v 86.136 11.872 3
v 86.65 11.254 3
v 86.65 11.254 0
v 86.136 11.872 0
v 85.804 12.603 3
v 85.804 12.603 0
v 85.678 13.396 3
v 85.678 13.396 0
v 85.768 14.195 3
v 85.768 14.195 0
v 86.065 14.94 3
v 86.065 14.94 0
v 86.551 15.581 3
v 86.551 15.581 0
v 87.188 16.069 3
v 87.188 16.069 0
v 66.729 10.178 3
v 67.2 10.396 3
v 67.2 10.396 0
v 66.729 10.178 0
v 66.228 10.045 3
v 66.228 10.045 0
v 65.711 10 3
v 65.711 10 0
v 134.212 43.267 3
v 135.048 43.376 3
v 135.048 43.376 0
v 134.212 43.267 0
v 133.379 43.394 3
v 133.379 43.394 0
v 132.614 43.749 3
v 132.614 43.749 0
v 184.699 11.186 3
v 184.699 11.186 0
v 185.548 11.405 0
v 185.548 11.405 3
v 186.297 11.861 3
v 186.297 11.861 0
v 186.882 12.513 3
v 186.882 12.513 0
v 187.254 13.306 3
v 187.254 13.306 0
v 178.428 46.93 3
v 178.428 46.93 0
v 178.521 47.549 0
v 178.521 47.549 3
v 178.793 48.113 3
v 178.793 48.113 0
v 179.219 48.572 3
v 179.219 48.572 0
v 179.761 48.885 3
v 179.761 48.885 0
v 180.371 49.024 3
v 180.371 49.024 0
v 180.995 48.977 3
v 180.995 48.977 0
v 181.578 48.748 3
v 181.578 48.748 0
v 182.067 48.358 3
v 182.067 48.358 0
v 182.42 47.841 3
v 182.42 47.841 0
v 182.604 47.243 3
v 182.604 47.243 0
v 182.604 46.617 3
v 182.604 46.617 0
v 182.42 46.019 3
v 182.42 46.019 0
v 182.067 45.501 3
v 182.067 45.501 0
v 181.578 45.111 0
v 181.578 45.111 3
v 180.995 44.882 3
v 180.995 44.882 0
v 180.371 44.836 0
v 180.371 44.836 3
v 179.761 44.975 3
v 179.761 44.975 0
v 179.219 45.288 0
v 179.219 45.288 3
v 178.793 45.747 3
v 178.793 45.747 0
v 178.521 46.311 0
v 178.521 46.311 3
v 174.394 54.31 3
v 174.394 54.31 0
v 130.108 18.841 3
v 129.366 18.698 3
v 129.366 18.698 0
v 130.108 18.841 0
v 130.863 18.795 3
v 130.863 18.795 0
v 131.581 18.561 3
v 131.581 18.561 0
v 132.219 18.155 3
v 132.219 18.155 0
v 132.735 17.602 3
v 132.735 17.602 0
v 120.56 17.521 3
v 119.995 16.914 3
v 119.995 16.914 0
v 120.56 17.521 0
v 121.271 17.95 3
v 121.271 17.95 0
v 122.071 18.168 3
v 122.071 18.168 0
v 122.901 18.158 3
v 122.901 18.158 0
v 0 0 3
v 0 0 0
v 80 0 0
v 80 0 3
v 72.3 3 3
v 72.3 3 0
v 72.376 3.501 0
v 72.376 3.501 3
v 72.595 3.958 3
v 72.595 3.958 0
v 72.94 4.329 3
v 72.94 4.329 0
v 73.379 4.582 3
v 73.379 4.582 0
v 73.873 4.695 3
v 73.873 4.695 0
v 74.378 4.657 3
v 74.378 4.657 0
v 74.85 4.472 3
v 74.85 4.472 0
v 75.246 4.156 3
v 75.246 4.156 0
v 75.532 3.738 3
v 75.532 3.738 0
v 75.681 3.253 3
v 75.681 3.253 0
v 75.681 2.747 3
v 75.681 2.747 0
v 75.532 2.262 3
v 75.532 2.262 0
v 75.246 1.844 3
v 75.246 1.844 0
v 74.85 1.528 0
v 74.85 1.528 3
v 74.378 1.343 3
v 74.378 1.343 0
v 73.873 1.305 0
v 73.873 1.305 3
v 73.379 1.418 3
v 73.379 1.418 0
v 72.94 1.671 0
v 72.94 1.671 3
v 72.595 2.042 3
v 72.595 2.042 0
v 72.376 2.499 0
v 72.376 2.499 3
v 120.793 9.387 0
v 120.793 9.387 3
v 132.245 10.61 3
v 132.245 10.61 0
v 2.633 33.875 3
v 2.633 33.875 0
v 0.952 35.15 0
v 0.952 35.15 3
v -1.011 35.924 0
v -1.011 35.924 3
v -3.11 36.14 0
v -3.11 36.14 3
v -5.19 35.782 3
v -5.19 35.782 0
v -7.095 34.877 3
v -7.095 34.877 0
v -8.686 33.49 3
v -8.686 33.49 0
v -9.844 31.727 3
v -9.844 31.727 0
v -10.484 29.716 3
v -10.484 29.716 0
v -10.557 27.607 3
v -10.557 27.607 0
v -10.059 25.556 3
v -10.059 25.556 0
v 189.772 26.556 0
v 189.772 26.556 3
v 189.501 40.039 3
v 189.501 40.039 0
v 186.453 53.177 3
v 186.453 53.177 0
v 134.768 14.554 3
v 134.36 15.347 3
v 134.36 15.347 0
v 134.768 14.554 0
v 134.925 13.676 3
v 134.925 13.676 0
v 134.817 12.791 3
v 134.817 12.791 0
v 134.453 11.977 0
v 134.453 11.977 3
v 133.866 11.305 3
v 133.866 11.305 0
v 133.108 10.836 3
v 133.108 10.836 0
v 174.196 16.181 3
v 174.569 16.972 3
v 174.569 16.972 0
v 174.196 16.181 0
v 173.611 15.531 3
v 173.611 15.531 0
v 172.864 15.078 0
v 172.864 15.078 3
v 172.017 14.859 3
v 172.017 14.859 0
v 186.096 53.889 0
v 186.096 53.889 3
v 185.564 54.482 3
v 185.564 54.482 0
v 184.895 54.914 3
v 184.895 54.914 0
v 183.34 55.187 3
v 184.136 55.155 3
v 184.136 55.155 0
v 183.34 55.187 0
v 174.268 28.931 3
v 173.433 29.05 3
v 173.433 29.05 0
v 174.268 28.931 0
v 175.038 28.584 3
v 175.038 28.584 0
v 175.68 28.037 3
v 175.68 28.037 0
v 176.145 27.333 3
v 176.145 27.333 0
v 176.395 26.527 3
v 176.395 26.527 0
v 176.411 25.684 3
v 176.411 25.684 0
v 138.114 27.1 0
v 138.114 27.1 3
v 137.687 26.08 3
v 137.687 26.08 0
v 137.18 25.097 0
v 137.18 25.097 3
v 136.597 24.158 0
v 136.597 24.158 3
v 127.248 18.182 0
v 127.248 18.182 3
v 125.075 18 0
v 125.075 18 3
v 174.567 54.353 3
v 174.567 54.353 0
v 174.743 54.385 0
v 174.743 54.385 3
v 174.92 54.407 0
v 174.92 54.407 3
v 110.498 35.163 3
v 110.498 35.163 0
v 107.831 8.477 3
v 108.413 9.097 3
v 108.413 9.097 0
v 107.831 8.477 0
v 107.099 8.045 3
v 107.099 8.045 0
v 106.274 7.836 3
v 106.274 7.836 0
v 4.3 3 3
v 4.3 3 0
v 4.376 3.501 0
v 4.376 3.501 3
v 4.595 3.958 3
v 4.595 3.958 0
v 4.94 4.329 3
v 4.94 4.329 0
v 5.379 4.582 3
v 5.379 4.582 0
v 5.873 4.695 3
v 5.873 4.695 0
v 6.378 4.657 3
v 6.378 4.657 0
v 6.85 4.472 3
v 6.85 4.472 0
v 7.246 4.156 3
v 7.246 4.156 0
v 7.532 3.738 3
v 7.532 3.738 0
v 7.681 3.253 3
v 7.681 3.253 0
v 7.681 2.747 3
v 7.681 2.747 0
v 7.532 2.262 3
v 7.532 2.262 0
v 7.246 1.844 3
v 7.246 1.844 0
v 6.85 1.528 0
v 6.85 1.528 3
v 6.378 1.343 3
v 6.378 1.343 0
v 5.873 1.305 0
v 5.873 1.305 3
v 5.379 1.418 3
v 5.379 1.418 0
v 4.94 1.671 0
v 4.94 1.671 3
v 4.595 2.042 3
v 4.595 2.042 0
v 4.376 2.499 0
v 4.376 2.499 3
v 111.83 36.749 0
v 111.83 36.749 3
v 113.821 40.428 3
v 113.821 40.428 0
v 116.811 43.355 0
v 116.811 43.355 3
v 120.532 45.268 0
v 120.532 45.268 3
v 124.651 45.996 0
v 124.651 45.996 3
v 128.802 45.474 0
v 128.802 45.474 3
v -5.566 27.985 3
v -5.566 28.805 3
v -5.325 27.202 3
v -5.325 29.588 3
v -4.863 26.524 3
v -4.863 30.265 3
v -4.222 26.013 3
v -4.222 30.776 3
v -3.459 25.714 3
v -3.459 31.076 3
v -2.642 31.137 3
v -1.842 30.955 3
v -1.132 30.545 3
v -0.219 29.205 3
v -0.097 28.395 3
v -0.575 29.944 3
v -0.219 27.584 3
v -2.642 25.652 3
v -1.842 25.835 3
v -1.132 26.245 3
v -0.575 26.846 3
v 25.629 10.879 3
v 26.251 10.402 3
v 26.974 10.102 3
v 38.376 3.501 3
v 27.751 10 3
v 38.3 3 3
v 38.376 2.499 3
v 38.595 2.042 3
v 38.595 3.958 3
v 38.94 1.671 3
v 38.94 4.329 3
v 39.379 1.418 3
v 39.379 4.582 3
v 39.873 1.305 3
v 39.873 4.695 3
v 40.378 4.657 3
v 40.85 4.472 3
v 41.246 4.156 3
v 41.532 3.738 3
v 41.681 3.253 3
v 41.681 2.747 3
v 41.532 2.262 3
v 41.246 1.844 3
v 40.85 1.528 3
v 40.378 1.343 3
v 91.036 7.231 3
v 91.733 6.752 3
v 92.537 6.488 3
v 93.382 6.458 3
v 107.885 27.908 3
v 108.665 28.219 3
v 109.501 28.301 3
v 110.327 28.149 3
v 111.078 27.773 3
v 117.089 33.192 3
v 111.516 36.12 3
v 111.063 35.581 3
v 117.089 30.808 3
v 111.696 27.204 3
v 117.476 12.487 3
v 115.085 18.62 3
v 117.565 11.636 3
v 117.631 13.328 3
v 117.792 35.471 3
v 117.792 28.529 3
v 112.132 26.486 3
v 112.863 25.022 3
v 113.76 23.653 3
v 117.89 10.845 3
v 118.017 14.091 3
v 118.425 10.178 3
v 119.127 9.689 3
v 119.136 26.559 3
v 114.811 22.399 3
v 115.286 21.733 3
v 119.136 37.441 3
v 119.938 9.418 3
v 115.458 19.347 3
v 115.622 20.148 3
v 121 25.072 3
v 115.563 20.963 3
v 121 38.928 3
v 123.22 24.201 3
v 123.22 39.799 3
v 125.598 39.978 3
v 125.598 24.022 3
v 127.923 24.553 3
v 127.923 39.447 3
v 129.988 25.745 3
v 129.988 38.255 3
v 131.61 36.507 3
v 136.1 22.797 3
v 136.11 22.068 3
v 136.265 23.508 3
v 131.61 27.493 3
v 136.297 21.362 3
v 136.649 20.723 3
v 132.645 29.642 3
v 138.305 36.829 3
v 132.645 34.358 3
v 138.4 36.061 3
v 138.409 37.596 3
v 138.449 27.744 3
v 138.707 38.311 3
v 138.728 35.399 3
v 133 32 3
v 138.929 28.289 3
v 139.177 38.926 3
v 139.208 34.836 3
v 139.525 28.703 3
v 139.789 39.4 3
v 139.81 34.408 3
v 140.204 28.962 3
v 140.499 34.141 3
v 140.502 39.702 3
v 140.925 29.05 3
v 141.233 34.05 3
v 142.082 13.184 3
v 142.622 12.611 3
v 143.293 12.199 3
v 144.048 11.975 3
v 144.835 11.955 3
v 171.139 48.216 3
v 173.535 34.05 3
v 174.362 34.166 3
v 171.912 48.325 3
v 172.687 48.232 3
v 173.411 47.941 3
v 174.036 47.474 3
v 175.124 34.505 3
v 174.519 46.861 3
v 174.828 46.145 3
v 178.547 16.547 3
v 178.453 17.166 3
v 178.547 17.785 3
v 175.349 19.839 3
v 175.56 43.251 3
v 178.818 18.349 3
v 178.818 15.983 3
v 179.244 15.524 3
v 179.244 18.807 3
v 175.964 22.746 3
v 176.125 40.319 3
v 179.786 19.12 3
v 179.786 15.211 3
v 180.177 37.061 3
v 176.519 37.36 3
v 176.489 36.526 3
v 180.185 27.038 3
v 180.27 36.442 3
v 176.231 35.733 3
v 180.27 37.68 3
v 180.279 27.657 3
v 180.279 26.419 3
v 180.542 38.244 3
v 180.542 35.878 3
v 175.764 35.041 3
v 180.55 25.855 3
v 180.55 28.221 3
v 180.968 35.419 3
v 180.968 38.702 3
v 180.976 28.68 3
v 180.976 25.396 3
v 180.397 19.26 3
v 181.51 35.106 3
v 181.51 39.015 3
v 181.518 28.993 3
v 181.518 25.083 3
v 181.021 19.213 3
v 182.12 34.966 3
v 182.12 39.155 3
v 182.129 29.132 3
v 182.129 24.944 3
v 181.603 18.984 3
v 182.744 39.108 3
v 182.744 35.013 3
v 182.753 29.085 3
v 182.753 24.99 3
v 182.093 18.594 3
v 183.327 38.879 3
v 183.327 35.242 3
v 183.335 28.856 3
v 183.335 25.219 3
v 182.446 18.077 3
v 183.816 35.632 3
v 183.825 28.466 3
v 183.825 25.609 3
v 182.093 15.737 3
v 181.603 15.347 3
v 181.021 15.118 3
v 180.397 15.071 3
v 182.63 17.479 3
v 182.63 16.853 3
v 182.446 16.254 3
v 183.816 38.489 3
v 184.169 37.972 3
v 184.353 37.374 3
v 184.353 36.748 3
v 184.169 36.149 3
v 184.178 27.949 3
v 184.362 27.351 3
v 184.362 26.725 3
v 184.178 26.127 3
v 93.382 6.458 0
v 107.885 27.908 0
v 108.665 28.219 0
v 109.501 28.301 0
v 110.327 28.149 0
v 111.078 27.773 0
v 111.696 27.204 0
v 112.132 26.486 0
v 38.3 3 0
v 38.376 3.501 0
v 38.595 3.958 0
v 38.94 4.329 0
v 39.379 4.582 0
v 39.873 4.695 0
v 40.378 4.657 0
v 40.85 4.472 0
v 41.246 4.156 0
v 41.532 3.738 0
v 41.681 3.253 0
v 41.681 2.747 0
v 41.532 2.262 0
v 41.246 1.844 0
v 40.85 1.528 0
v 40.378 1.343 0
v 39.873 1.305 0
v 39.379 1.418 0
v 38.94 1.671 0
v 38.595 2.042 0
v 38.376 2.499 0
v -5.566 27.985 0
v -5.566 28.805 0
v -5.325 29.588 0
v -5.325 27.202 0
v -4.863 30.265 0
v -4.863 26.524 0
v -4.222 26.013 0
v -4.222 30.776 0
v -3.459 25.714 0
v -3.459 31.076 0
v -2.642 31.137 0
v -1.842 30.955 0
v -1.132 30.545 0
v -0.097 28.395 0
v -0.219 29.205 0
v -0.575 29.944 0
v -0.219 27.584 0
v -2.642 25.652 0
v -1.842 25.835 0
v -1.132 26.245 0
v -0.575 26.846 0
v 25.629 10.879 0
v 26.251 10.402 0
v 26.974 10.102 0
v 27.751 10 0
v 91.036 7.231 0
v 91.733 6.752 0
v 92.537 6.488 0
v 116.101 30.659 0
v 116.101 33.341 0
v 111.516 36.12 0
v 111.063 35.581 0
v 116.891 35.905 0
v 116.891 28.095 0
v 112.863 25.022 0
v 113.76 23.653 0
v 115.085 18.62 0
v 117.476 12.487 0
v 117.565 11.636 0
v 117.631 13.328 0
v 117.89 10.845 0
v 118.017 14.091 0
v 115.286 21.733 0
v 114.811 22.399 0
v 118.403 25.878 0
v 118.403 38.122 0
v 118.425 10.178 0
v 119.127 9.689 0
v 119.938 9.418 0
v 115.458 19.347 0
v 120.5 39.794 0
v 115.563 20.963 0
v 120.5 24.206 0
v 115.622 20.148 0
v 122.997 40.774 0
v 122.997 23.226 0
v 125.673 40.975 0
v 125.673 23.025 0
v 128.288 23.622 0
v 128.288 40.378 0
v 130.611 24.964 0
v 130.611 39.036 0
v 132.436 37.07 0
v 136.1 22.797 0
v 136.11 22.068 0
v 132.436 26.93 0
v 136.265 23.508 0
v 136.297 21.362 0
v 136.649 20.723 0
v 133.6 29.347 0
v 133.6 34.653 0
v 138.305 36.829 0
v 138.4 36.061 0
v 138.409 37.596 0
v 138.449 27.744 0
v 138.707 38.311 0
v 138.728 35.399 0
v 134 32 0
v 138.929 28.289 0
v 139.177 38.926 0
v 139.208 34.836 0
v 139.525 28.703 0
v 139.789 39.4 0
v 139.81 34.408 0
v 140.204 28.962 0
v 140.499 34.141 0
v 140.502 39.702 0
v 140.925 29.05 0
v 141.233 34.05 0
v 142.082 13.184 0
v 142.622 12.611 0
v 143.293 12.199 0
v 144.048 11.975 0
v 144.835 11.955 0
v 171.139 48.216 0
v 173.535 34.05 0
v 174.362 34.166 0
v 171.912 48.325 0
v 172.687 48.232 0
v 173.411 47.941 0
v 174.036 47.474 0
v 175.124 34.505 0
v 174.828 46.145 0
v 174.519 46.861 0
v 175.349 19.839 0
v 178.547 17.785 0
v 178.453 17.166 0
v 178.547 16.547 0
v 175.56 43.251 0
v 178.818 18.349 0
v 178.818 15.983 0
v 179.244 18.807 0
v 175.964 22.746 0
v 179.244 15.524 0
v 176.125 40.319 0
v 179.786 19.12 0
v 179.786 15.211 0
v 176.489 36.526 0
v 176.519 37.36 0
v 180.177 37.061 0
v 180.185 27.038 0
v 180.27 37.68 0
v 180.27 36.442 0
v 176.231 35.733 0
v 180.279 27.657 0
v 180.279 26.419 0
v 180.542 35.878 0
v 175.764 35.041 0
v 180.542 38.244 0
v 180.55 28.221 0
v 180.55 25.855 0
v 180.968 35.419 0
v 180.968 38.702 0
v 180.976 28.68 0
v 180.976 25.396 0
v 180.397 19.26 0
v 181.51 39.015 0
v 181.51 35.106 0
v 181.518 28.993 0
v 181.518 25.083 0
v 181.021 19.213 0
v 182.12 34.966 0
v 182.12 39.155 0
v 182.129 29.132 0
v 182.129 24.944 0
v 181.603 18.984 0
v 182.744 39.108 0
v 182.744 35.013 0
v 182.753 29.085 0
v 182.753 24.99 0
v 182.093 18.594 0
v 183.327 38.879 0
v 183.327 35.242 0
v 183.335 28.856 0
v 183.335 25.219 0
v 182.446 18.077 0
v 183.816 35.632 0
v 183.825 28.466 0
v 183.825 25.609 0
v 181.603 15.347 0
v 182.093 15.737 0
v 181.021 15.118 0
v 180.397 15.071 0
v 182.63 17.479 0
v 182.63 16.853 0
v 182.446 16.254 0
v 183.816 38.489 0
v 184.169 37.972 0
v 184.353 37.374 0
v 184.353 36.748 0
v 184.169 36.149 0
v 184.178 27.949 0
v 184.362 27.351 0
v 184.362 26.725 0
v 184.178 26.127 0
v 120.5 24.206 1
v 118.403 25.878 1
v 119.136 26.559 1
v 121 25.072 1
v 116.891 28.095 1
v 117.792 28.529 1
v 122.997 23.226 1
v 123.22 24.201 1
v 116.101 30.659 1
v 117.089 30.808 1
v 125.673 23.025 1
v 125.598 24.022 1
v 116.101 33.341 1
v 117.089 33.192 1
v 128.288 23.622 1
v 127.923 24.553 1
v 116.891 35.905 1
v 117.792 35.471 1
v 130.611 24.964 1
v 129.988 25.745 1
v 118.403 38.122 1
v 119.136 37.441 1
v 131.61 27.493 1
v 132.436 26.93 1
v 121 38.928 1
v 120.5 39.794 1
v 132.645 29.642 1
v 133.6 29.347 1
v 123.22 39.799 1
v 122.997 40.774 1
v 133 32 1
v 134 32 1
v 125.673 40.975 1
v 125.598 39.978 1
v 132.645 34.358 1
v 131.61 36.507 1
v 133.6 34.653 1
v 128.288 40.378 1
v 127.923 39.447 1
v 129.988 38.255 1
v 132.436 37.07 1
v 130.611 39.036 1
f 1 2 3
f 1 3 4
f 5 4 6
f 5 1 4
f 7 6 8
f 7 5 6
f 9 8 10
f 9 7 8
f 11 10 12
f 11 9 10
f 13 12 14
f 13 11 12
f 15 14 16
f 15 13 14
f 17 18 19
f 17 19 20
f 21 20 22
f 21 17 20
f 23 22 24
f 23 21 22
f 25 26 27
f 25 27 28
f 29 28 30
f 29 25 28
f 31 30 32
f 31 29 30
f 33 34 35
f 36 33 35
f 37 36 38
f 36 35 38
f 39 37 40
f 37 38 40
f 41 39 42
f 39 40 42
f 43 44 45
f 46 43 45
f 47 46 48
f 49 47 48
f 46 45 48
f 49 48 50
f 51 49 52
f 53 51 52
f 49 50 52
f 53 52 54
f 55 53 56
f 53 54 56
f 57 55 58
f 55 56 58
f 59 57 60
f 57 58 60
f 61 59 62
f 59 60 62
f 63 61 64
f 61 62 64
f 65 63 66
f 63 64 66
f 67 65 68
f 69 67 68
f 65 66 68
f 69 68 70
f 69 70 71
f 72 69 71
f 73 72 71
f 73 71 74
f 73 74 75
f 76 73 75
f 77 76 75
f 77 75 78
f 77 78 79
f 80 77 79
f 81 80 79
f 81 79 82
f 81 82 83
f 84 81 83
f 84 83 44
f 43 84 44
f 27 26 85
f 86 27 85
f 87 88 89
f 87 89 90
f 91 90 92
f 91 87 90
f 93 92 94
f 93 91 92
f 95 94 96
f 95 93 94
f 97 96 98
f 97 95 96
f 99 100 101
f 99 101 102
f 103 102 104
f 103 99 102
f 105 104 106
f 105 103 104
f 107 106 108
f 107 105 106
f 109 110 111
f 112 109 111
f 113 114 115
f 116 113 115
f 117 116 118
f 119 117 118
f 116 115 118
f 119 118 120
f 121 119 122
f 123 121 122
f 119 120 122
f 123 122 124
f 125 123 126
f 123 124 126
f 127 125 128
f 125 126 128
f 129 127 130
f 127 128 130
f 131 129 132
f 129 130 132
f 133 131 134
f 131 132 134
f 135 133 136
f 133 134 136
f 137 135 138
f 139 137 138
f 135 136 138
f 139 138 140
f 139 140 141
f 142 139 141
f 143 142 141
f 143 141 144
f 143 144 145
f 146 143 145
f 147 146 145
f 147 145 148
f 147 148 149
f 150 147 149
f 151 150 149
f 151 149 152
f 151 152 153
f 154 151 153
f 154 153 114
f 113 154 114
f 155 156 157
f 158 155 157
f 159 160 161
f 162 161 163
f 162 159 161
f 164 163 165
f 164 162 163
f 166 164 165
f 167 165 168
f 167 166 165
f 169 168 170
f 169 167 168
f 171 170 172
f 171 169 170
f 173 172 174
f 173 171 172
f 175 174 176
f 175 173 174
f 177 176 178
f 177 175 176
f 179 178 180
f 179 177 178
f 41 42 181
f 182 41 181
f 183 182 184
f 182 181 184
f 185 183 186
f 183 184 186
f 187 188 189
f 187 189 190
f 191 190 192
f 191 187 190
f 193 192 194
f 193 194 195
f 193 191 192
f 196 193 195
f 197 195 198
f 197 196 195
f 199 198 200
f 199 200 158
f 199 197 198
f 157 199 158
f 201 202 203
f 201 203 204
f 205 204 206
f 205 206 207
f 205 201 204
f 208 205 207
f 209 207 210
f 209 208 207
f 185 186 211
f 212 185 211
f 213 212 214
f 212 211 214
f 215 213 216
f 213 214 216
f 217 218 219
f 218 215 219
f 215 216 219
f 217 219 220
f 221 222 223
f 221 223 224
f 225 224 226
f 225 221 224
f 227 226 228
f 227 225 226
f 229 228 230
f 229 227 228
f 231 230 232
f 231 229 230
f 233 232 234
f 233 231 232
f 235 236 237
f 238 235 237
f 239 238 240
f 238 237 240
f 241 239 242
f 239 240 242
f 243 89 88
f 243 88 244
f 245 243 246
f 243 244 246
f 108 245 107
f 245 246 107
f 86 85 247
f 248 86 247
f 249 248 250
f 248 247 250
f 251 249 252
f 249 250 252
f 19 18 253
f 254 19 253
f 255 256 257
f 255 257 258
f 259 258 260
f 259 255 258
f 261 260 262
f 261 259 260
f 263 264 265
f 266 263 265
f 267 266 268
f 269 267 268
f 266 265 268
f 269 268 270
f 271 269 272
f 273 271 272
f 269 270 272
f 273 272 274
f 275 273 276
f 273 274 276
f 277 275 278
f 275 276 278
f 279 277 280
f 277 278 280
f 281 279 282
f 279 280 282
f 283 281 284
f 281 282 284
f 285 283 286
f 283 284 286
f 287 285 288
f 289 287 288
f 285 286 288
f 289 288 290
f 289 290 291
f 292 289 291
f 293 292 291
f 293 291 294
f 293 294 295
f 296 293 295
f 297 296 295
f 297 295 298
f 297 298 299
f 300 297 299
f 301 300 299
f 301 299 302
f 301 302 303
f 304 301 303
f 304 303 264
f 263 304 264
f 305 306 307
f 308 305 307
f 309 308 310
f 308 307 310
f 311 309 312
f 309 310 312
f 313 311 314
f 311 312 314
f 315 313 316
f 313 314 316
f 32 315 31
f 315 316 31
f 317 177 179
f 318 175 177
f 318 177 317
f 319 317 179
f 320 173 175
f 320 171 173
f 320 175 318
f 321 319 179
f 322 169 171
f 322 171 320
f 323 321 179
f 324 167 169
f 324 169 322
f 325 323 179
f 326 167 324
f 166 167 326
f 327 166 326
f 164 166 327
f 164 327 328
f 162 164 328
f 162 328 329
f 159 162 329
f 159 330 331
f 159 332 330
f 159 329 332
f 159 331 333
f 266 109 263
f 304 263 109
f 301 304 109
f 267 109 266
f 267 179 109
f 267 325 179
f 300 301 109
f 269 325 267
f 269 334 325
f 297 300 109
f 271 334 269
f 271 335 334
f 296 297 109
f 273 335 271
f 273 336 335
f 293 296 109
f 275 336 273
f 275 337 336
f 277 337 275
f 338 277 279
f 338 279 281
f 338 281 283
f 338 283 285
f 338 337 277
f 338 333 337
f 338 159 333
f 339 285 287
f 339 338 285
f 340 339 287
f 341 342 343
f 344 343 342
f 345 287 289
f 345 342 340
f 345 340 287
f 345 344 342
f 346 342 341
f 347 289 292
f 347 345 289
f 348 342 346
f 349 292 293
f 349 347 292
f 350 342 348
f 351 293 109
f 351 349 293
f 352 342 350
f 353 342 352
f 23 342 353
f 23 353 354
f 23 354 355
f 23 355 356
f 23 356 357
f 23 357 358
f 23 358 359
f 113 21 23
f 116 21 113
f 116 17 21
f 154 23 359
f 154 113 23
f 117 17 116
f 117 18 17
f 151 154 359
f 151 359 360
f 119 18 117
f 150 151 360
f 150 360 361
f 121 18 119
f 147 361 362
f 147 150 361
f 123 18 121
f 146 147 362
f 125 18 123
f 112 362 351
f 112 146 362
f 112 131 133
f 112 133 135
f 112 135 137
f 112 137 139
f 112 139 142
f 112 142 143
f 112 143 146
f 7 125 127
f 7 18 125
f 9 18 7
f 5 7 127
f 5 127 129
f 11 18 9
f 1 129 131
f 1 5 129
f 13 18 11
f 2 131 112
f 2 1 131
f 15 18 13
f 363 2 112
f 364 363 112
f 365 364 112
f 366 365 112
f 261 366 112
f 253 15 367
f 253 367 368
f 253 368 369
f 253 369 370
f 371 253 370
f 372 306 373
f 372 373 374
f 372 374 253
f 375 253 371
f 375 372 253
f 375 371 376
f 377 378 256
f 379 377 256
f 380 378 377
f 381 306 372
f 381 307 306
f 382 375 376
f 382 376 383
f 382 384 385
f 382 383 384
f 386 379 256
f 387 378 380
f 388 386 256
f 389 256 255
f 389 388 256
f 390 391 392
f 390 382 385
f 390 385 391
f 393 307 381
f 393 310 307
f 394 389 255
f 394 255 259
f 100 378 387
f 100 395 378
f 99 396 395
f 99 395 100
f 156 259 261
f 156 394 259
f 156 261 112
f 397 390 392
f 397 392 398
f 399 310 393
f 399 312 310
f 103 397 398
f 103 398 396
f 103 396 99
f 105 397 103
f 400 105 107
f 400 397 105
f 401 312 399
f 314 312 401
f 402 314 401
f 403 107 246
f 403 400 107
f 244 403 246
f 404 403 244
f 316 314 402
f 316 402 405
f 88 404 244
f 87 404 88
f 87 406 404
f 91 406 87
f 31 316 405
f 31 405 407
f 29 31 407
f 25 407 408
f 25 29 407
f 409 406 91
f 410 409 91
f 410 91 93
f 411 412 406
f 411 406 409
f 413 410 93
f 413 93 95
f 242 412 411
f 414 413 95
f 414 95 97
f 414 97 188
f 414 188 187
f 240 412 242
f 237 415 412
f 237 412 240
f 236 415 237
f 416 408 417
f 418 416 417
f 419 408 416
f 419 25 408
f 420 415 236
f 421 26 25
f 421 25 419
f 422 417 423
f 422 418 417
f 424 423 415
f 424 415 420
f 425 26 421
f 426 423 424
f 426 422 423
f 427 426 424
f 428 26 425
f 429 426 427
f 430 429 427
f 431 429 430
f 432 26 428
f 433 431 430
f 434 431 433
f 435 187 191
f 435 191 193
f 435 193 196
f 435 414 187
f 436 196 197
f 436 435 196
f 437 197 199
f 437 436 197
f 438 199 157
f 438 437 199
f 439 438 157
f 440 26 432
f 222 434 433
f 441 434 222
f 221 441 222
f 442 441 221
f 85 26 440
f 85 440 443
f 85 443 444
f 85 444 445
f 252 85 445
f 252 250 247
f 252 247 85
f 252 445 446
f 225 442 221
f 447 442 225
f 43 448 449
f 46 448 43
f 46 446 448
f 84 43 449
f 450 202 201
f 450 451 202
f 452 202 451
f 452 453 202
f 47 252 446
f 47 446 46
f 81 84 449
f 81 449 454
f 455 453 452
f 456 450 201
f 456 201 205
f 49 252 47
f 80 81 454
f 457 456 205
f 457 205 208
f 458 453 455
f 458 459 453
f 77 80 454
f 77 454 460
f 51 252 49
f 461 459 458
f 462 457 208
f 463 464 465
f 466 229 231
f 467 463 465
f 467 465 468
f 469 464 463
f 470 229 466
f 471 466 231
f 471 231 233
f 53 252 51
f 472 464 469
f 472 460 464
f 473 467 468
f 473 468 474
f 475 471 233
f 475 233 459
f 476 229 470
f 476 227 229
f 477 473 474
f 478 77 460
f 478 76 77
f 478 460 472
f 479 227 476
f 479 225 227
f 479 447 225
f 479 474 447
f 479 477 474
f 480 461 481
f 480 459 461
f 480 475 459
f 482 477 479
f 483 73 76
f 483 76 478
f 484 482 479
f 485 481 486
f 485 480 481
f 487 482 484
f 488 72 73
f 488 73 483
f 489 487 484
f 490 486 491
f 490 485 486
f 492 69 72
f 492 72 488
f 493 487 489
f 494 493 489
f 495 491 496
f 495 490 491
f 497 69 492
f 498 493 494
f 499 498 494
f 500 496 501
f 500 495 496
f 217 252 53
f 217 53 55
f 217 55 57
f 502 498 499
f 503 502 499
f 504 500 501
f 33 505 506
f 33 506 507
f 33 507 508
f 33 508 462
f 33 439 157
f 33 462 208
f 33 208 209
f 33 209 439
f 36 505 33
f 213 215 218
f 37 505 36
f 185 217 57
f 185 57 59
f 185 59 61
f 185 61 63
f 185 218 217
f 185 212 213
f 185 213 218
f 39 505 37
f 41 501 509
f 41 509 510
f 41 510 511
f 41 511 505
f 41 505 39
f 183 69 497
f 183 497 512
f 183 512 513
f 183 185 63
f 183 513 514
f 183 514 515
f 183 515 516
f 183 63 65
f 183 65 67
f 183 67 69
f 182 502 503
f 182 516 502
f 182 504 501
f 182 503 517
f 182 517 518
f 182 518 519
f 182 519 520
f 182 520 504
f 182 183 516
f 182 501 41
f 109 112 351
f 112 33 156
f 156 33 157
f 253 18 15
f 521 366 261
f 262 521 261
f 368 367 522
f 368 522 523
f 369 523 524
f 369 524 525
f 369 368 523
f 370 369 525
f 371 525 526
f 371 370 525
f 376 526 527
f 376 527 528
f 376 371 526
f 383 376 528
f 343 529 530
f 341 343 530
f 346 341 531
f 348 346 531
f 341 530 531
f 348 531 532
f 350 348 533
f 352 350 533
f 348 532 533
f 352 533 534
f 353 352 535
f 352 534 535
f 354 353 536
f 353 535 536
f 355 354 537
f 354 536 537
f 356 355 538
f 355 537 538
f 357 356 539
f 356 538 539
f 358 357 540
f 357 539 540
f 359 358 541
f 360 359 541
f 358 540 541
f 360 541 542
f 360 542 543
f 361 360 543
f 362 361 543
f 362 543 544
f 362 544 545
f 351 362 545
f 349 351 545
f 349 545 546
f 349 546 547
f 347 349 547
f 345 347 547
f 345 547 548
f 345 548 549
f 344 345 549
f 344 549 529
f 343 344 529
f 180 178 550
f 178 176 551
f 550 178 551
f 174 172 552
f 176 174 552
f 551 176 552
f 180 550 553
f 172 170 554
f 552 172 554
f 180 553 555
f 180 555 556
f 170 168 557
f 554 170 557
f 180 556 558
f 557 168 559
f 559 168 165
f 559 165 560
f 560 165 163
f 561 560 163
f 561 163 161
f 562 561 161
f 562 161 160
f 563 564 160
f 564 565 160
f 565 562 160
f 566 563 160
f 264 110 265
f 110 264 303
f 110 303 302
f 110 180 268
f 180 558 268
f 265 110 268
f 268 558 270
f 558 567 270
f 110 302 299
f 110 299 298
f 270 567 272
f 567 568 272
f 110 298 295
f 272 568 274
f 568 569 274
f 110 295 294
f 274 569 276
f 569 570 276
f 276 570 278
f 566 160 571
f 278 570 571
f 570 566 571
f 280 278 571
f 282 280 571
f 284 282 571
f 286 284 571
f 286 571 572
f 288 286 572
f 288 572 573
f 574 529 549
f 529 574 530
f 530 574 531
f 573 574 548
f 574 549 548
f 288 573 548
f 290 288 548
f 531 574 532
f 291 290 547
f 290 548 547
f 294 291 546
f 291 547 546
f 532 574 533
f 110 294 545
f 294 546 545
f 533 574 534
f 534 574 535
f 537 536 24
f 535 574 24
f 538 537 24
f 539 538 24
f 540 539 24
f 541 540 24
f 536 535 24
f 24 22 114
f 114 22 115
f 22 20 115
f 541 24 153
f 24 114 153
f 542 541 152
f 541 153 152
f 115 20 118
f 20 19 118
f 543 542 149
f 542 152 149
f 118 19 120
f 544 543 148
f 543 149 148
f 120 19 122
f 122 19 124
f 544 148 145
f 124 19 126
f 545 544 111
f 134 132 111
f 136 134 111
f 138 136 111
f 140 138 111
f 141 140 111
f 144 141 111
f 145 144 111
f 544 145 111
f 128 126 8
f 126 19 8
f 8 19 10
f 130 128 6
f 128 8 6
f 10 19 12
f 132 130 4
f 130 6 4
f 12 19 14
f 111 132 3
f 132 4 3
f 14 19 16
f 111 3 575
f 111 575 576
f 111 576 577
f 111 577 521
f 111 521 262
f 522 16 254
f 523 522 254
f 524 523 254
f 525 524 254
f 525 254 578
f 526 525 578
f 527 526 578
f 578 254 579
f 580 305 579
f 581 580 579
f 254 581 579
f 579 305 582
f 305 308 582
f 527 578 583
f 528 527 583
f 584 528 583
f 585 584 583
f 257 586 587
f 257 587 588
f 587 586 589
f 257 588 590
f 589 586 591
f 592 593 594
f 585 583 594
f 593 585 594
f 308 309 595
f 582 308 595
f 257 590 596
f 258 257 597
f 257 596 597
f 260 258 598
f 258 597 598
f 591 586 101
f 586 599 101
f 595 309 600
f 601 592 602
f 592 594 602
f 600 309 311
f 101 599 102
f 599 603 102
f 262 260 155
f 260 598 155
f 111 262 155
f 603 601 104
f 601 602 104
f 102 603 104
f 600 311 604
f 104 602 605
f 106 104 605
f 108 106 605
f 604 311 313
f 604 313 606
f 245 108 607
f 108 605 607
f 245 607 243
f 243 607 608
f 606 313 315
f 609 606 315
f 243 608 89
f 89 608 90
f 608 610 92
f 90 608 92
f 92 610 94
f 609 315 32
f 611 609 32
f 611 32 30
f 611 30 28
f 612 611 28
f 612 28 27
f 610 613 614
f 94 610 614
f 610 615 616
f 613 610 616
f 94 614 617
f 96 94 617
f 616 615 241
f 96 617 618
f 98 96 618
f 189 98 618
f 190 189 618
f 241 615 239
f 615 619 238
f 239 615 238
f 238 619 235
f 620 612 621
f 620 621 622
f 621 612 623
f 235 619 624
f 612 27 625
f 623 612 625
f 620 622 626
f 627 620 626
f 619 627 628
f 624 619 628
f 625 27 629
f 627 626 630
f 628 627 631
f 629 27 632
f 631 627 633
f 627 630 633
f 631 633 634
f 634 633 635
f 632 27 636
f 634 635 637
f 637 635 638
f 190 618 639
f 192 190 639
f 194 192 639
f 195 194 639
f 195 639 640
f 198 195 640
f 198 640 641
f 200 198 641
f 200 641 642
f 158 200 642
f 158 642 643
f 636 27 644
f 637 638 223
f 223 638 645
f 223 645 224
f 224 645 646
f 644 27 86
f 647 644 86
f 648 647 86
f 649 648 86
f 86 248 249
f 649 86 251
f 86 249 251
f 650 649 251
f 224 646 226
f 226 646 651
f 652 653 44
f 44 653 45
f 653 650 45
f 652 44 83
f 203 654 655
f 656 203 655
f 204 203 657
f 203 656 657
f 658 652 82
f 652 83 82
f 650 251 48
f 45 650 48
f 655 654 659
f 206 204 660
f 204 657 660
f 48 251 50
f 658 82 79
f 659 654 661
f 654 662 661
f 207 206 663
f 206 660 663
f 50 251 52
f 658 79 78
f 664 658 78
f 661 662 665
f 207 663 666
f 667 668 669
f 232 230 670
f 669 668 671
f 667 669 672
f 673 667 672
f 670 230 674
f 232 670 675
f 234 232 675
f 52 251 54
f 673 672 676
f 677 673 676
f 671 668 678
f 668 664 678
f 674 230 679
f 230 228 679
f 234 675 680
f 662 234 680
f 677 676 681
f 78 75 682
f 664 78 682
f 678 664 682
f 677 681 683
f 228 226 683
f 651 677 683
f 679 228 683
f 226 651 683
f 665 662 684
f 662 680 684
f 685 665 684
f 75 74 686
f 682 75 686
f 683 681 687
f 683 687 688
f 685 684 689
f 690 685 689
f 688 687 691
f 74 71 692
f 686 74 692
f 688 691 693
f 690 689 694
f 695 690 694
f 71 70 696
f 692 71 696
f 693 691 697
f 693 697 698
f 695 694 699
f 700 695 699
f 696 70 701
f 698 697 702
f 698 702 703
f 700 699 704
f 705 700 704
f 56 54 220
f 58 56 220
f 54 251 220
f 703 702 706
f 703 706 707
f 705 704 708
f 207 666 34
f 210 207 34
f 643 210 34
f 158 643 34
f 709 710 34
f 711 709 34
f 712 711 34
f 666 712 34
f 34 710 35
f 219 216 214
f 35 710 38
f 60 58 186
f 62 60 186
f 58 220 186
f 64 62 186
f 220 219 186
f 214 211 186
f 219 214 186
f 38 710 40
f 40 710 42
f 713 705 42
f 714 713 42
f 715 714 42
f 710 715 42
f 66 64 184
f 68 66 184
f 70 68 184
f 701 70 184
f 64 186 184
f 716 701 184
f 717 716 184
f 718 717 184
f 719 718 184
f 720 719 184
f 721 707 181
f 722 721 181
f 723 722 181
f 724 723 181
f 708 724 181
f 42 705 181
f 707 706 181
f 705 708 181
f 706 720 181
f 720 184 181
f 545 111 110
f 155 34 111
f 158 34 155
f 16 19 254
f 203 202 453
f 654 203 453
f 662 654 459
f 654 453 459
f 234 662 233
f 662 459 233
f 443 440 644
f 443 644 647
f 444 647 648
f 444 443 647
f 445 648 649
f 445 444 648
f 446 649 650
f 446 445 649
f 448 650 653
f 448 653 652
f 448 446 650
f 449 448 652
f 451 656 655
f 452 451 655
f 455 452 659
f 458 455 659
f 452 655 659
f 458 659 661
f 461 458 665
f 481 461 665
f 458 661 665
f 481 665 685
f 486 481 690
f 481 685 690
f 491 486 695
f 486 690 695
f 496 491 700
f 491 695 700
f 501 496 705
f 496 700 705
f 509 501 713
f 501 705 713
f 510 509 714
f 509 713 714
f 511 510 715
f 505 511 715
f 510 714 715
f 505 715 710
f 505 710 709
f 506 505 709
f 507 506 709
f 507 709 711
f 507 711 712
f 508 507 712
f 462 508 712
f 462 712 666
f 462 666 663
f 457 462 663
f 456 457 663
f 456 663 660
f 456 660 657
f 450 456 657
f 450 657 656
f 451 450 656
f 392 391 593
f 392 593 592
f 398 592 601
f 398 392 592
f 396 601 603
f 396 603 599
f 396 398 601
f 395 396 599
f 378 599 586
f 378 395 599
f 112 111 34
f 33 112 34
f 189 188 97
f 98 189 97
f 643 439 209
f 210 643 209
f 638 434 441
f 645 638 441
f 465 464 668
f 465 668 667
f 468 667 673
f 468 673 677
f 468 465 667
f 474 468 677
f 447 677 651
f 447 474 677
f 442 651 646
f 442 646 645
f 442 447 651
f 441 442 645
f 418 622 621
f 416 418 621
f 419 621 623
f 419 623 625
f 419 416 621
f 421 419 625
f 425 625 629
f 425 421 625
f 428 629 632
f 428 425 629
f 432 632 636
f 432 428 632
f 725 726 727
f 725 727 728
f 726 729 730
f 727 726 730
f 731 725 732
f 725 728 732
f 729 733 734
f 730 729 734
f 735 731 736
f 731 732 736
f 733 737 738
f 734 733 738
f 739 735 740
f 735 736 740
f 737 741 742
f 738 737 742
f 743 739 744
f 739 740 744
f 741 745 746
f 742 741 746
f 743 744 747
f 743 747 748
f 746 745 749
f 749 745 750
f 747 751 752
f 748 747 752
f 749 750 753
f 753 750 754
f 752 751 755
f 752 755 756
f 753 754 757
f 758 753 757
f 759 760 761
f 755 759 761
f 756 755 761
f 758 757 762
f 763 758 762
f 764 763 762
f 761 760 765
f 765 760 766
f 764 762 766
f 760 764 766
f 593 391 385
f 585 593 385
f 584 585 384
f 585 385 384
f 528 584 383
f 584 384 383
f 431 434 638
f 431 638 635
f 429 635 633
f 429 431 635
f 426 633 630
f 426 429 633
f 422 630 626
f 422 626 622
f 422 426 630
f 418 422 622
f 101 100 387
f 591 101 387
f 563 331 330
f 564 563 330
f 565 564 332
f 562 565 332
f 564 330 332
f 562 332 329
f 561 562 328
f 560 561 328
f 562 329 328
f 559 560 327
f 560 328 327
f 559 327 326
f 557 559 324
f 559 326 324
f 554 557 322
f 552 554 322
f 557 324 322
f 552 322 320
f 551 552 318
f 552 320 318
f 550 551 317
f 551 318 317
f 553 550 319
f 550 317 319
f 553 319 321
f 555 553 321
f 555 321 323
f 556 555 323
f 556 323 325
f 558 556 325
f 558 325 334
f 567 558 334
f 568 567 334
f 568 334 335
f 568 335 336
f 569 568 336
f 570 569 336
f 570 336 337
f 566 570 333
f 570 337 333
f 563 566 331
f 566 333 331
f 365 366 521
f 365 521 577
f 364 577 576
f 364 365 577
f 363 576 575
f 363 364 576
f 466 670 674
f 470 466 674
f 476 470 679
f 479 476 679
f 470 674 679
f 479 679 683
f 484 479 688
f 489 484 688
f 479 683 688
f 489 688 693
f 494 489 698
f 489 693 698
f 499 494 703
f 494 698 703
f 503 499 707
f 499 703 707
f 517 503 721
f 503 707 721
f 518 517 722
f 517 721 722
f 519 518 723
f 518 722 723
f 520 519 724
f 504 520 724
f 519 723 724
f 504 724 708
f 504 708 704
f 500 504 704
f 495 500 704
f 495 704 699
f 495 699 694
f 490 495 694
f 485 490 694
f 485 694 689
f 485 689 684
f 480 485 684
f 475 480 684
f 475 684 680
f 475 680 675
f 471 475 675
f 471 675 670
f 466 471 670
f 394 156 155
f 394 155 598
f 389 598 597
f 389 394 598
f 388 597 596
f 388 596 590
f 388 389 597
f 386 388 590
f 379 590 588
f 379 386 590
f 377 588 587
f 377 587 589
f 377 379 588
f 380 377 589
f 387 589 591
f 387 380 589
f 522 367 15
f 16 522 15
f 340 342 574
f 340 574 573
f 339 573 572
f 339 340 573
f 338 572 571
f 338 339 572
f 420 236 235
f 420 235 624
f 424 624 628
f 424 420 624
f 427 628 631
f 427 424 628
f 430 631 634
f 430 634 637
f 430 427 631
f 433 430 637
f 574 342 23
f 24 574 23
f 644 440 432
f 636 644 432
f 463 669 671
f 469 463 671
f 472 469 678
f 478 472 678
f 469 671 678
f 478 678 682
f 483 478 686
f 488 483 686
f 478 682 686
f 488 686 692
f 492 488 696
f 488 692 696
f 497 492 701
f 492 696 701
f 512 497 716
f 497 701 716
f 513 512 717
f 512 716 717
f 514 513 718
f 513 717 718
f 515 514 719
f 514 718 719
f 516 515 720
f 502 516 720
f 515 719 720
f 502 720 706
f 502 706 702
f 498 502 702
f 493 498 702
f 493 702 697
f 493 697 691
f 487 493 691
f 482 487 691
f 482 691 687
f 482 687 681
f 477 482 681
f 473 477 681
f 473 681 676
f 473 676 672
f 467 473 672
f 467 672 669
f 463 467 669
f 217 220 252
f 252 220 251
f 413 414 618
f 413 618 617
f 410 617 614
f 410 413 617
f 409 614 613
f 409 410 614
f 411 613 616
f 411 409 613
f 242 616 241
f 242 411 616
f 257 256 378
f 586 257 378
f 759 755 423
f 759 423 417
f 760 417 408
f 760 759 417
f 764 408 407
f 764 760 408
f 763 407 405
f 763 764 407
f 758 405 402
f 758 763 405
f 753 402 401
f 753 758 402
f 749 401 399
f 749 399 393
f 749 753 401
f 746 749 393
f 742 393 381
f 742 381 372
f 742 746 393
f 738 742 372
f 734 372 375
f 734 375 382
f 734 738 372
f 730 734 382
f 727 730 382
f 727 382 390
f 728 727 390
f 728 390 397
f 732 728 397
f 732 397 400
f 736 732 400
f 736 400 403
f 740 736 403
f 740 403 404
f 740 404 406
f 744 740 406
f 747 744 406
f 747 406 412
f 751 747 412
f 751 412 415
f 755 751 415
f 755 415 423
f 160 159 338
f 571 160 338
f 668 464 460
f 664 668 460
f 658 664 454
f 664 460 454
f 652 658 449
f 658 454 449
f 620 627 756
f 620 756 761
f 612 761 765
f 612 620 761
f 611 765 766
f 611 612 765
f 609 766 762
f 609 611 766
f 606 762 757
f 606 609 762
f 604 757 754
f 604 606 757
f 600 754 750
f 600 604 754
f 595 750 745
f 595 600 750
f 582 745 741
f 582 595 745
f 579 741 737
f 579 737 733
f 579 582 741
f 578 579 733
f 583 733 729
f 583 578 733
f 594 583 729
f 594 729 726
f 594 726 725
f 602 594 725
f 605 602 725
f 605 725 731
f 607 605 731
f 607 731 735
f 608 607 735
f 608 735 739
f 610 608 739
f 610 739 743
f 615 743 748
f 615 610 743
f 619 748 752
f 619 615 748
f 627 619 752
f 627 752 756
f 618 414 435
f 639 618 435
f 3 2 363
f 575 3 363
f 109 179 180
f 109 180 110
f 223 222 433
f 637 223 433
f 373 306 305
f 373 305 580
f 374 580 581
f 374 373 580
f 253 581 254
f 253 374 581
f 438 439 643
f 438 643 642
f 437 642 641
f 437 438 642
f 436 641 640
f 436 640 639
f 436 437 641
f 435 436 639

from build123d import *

# Parameters (mm, degrees)
SKETCH_1_R          = 8.000000000000027
EXTRUDE_1_DEPTH     = 3
HOLE_WIZARD_M31_D   = 3.4
SKETCH_5_R          = 2.749999999999999
EXTRUDE_2_DEPTH     = 3
CUT_EXTRUDE_1_DEPTH = 198.9348007797117
M5X0_81_D           = 4.2
CUT_EXTRUDE_2_DEPTH = 198.9348007797117
CUT_EXTRUDE_3_DEPTH = 198.9348007797117
FILLET_1_R          = 3
SKETCH_12_R         = 8.999999999999996
CUT_EXTRUDE_4_DEPTH = 1


with BuildPart() as part:
    # Эскиз1 → Бобышка-Вытянуть1 (new body)
    with BuildSketch(Plane.XY):
        with BuildLine():
            Line((0, 0), (80, 0))
            Line((80, 0), (186.64735263363326, 11.394080625595256))
            ThreePointArc((186.64735263363326, 11.394080625595256), (189.98303763522418, 33.48486352875775), (185.64181138843185, 55.40022887772366))
            Line((185.64181138843185, 55.40022887772366), (29.81788185582472, 40.959090919498855))
            Line((29.81788185582472, 40.959090919498855), (1.6e-16, 40.959090919498855))
            Line((1.6e-16, 40.959090919498855), (0, 0))
        make_face()
        with Locations((124.99999999999999, 31.999999999999986)):
            Circle(SKETCH_1_R, mode=Mode.SUBTRACT)
    extrude(amount=EXTRUDE_1_DEPTH)

    # Отверстие с зазором M31 (through all)
    with Locations(Plane.XY.offset(3)):
        with Locations((6, 3), (40, 3), (74, 3)):
            Hole(HOLE_WIZARD_M31_D / 2)

    # Эскиз5 → Бобышка-Вытянуть2 (add)
    with BuildSketch(Plane.XY.offset(3)):
        with BuildLine():
            Line((-10.05858051013897, 25.55645888767347), (0, 0))
            Line((0, 0), (0, 21.18668565496398))
            ThreePointArc((0, 21.18668565496398), (0.24099496955508215, 35.503000018294074), (-10.05858051013897, 25.55645888767347))
        make_face()
        with Locations((-2.8470386460772503, 28.39479712384004)):
            Circle(SKETCH_5_R, mode=Mode.SUBTRACT)
    extrude(amount=-EXTRUDE_2_DEPTH)

    # Эскиз6 → Вырез-Вытянуть1 (cut, through all)
    with BuildSketch(Plane.XY.offset(3)):
        with BuildLine():
            Line((2.6330389081184924, 33.874874678035766), (26.507913586154185, 10.000000000000002))
            Line((26.507913586154185, 10.000000000000002), (66.50791358615419, 10))
            Line((66.50791358615419, 10), (104.37682925914895, 47.8689156729949))
            Line((104.37682925914895, 47.8689156729949), (29.817881855824798, 40.95909091949886))
            Line((29.817881855824798, 40.95909091949886), (1.6e-16, 40.959090919498855))
            Line((1.6e-16, 40.959090919498855), (0, 35.60290859271609))
            ThreePointArc((0, 35.60290859271609), (1.4052244403019993, 34.874053149358424), (2.6330389081184924, 33.874874678035766))
        make_face()
    extrude(amount=-CUT_EXTRUDE_1_DEPTH, mode=Mode.SUBTRACT)

    # Отверстие обработанное метчиком M5x0.81 (through all)
    with Locations(Plane.XY.offset(3)):
        with Locations((180.527942872, 46.929754199), (182.276873258, 37.060611597), (182.285474835, 27.037704871), (180.553486246, 17.165574973)):
            Hole(M5X0_81_D / 2)

    # Эскиз10 → Вырез-Вытянуть2 (cut, through all)
    with BuildSketch(Plane.XY.offset(3)):
        with BuildLine():
            Line((66.50791358615419, 10), (111.50918528954904, 35.741379217384946))
            ThreePointArc((111.50918528954904, 35.741379217384946), (120.64604118056285, 45.30575223723353), (133.66945767503876, 42.9927477739058))
            Line((133.66945767503876, 42.9927477739058), (174.65262323365093, 54.38179491403086))
            Line((174.65262323365093, 54.38179491403086), (104.37682925914895, 47.8689156729949))
            Line((104.37682925914895, 47.8689156729949), (66.50791358615419, 10))
        make_face()
    extrude(amount=-CUT_EXTRUDE_2_DEPTH, mode=Mode.SUBTRACT)

    # Эскиз11 → Вырез-Вытянуть3 (cut, through all)
    with BuildSketch(Plane.XY.offset(3)):
        with BuildLine():
            Line((92.03441017428995, 6.314197935775633), (107.63021765734568, 7.980436088856215))
            Line((107.63021765734568, 7.980436088856215), (116.60825973560767, 20.79380995453953))
            ThreePointArc((116.60825973560767, 20.79380995453953), (113.01565006615179, 24.762917945534056), (111.17548635848748, 29.790289028937345))
            Line((111.17548635848748, 29.790289028937345), (83.6237542782258, 14.03029921690936))
            Line((83.6237542782258, 14.03029921690936), (92.03441017428995, 6.314197935775633))
        make_face()
        with BuildLine():
            Line((173.93078584223207, 48.99172434981097), (137.24012127463044, 38.79554495109394))
            ThreePointArc((137.24012127463044, 38.79554495109394), (138.25871477406997, 36.49516212609262), (138.84915367150305, 34.04962010701802))
            Line((138.84915367150305, 34.04962010701802), (176.75654119949715, 34.04962010701802))
            ThreePointArc((176.75654119949715, 34.04962010701802), (175.8950005059697, 41.62493755905363), (173.93078584223207, 48.99172434981097))
        make_face()
        with BuildLine():
            Line((121.13678636305278, 18.543567322826398), (114.22945460790407, 8.685490982627265))
            Line((114.22945460790407, 8.685490982627265), (137.37877384972535, 11.158737653597806))
            Line((137.37877384972535, 11.158737653597806), (131.35012272889716, 19.52298347648991))
            ThreePointArc((131.35012272889716, 19.52298347648991), (126.33641056880738, 18.063931444213534), (121.13678636305278, 18.543567322826398))
        make_face()
        with BuildLine():
            Line((143.10149490164468, 11.770146595809063), (173.95081110549165, 15.066052095485405))
            ThreePointArc((173.95081110549165, 15.066052095485405), (175.8152185482702, 21.96236763923512), (176.7130134299426, 29.049620107018022))
            Line((176.7130134299426, 29.049620107018022), (138.68558579261725, 29.049620107018022))
            ThreePointArc((138.68558579261725, 29.049620107018022), (137.43996226457978, 25.57759088380138), (135.33074101249935, 22.551413326181333))
            Line((135.33074101249935, 22.551413326181333), (143.10149490164468, 11.770146595809063))
        make_face()
    extrude(amount=-CUT_EXTRUDE_3_DEPTH, mode=Mode.SUBTRACT)

    # Скругление1
    # the kernel refuses this fillet: 3 mm, written as the material it adds along each edge
    with BuildSketch(Plane(origin=(133.66945767503876, 42.992747773905805, 3), x_dir=(-0.8130725400087585, 0.5821623868678788, 0), z_dir=(0, 0, -1))) as fillet_1_piece_1:
        with BuildLine():
            CenterArc((1.4378103136794376, 2.996771470104822), FILLET_1_R, 218.86683700391524, 48.47477501487009)
            Line((-0.8980091423480934, 1.1142339621535844), (0, 0))
            ThreePointArc((0, 0), (0.6493336900487631, 0.01506647284415901), (1.2986673800975244, 0))
        make_face()
    extrude(amount=3)
    with BuildSketch(Plane(origin=(111.50918528954904, 35.741379217384946, 3), x_dir=(-0.8680239741683529, -0.49652228577273216, 0), z_dir=(0, 0, -1))) as fillet_1_piece_2:
        with BuildLine():
            CenterArc((1.16542958022559, 2.9999999999999964), FILLET_1_R, 229.5997180782211, 40.4002819217792)
            ThreePointArc((-0.7789413643040896, 0.7153946445679564), (-0.382712836911811, 0.3650554500406897), (0, 0))
            Line((0, 0), (1.165429580225606, 1e-17))
        make_face()
    extrude(amount=3)
    with BuildSketch(Plane(origin=(92.03441017428995, 6.314197935775633, 3), x_dir=(0.9943411291859616, 0.10623426381910231, 0), z_dir=(0, 0, -1))) as fillet_1_piece_3:
        with BuildLine():
            CenterArc((FILLET_1_R * 0.451855277113, -FILLET_1_R), FILLET_1_R, 89.9999999999999, 48.632165419305906)
            Line((-FILLET_1_R * 0.298626929798, -FILLET_1_R * 0.339109345572), (0, 0))
            Line((0, 0), (FILLET_1_R * 0.451855277113, -1e-17))
        make_face()
    extrude(amount=3)
    with BuildSketch(Plane(origin=(83.6237542782258, 14.03029921690936, 3), x_dir=(0.8680239741683552, 0.496522285772728, 0), z_dir=(0, 0, -1))) as fillet_1_piece_4:
        with BuildLine():
            CenterArc((FILLET_1_R * 1.36872958736, FILLET_1_R), FILLET_1_R, 162.30406475526607, 107.69593524473399)
            Line((FILLET_1_R * 0.416046539376, FILLET_1_R * 1.30396547515), (0, 0))
            Line((0, 0), (FILLET_1_R * 1.36872958736, -5e-17))
        make_face()
    extrude(amount=3)
    with BuildSketch(Plane(origin=(111.17548635848748, 29.790289028937345, 3), x_dir=(0.2779694371109165, -0.960589918764631, 0), z_dir=(0, 0, -1))) as fillet_1_piece_5:
        with BuildLine():
            CenterArc((3.8089394275276667, 2.977268689428244), FILLET_1_R, 166.36886991345514, 96.57341947464624)
            Line((0.893440130163459, 3.684279189398942), (0, 0))
            ThreePointArc((0, 0), (1.720166193077011, 0.10607944933485743), (3.4403323861540267, -8e-17))
        make_face()
    extrude(amount=3)
    with BuildSketch(Plane(origin=(116.60825973560767, 20.79380995453953, 3), x_dir=(-0.5738346401441979, -0.8189711873873091, 0), z_dir=(0, 0, -1))) as fillet_1_piece_6:
        with BuildLine():
            CenterArc((2.6548645047083914, 3.0000000000000018), FILLET_1_R, 191.68179125859942, 78.31820874140055)
            ThreePointArc((-0.28299711772598396, 2.392571742979232), (-0.08993594197380265, 1.2023847782433434), (0, 0))
            Line((0, 0), (2.654864504708389, 0))
        make_face()
    extrude(amount=3)
    with BuildSketch(Plane(origin=(107.63021765734568, 7.980436088856215, 3), x_dir=(-0.9943411291859616, -0.10623426381910264, 0), z_dir=(0, 0, -1))) as fillet_1_piece_7:
        with BuildLine():
            CenterArc((FILLET_1_R * 0.4545006609, FILLET_1_R), FILLET_1_R, 221.11634455075327, 48.883655449246646)
            Line((-FILLET_1_R * 0.298875173788, FILLET_1_R * 0.342409814772), (0, 0))
            Line((0, 0), (FILLET_1_R * 0.4545006609, 0))
        make_face()
    extrude(amount=3)
    with BuildSketch(Plane(origin=(137.37877384972535, 11.158737653597806, 3), x_dir=(-0.9943411291859617, -0.10623426381910242, 0), z_dir=(0, 0, -1))) as fillet_1_piece_8:
        with BuildLine():
            CenterArc((FILLET_1_R * 1.72108797237, FILLET_1_R), FILLET_1_R, 150.3155592750541, 119.68444072494606)
            Line((FILLET_1_R * 0.852321942917, FILLET_1_R * 1.49522276409), (0, 0))
            Line((0, 0), (FILLET_1_R * 1.72108797237, -6e-17))
        make_face()
    extrude(amount=3)
    with BuildSketch(Plane(origin=(114.22945460790407, 8.685490982627265, 3), x_dir=(0.5738346401441975, 0.8189711873873095, 0), z_dir=(0, 0, -1))) as fillet_1_piece_9:
        with BuildLine():
            CenterArc((FILLET_1_R * 2.20021682261, FILLET_1_R), FILLET_1_R, 138.8836554492469, 131.11634455075307)
            Line((FILLET_1_R * 1.44684098792, FILLET_1_R * 1.65759018523), (0, 0))
            Line((0, 0), (FILLET_1_R * 2.20021682261, 2e-17))
        make_face()
    extrude(amount=3)
    with BuildSketch(Plane(origin=(121.13678636305278, 18.543567322826398, 3), x_dir=(-0.5738346401441984, -0.8189711873873087, 0), z_dir=(0, 0, -1))) as fillet_1_piece_10:
        with BuildLine():
            CenterArc((1.990265982493936, -3.0000000000000013), FILLET_1_R, 89.99999999999993, 63.60335445318877)
            ThreePointArc((-0.6969473887897009, -1.666251786432529), (-0.32157533753284756, -0.844376737614642), (0, 0))
            Line((0, 0), (1.9902659824939402, 5e-17))
        make_face()
    extrude(amount=3)
    with BuildSketch(Plane(origin=(131.35012272889716, 19.522983476489905, 3), x_dir=(0.5847130820131278, -0.8112401689528875, 0), z_dir=(0, 0, -1))) as fillet_1_piece_11:
        with BuildLine():
            CenterArc((2.3682065417982856, 3.0000000000000004), FILLET_1_R, 197.6131255819165, 72.3868744180835)
            ThreePointArc((-0.4911575816723561, 2.0922352675891354), (-0.20537262369653822, 1.0555561343908344), (0, 0))
            Line((0, 0), (2.368206541798286, 1e-17))
        make_face()
    extrude(amount=3)
    with BuildSketch(Plane(origin=(173.93078584223207, 48.99172434981097, 3), x_dir=(-0.9634885943550286, -0.26774937637232876, 0), z_dir=(0, 0, -1))) as fillet_1_piece_12:
        with BuildLine():
            CenterArc((2.897416461846995, -3.0000000000000013), FILLET_1_R, 90.00000000000013, 89.6828037551533)
            ThreePointArc((-0.1025375653525866, -2.9833917282944458), (-0.07276547265506263, -1.4909570345015974), (0, 0))
            Line((0, 0), (2.8974164618469884, -5e-17))
        make_face()
    extrude(amount=3)
    with BuildSketch(Plane(origin=(176.75654119949715, 34.04962010701802, 3), x_dir=(-1, 0, 0), z_dir=(0, 0, -1))) as fillet_1_piece_13:
        with BuildLine():
            CenterArc((3.221407714928148, 3), FILLET_1_R, 174.06028761643057, 95.93971238356943)
            ThreePointArc((0.23751372052348074, 3.310445857043881), (0.09223500645424565, 1.6571257852503223), (0, 0))
            Line((0, 0), (3.221407714928148, 0))
        make_face()
    extrude(amount=3)
    with BuildSketch(Plane(origin=(138.84915367150305, 34.04962010701802, 3), x_dir=(-0.22238352713061194, 0.9749592642059198, 0), z_dir=(0, 0, -1))) as fillet_1_piece_14:
        with BuildLine():
            CenterArc((2.394810958848804, 2.9910348047399777), FILLET_1_R, 192.84906769128517, 72.72030630224907)
            Line((-0.5300668337689619, 2.32388422334817), (0, 0))
            ThreePointArc((0, 0), (1.081527529802683, 0.04183757788016305), (2.163055059605388, 0))
        make_face()
    extrude(amount=3)
    with BuildSketch(Plane(origin=(137.24012127463044, 38.79554495109394, 3), x_dir=(0.9634885943550292, 0.2677493763723269, 0), z_dir=(0, 0, -1))) as fillet_1_piece_15:
        with BuildLine():
            CenterArc((3.3851332754644625, 3.0000000000000013), FILLET_1_R, 179.08948046092507, 90.91051953907493)
            ThreePointArc((0.3855120801952658, 3.047672684965048), (0.27660128884680796, 1.5132304278712665), (0, 0))
            Line((0, 0), (3.3851332754644634, 6e-17))
        make_face()
    extrude(amount=3)
    with BuildSketch(Plane(origin=(143.10149490164468, 11.770146595809063, 3), x_dir=(0.9943411291859617, 0.10623426381910227, 0), z_dir=(0, 0, -1))) as fillet_1_piece_16:
        with BuildLine():
            CenterArc((FILLET_1_R * 0.581027824292, -FILLET_1_R), FILLET_1_R, 90.00000000000017, 60.3155592750542)
            Line((-FILLET_1_R * 0.287738205159, -FILLET_1_R * 0.50477723591), (0, 0))
            Line((0, 0), (FILLET_1_R * 0.581027824292, -1e-17))
        make_face()
    extrude(amount=3)
    with BuildSketch(Plane(origin=(135.33074101249935, 22.551413326181333, 3), x_dir=(0.6191906205716086, 0.7852407117541386, 0), z_dir=(0, 0, -1))) as fillet_1_piece_17:
        with BuildLine():
            CenterArc((2.264587612579221, 2.9919845725048013), FILLET_1_R, 195.96022348085205, 69.85051867741447)
            Line((-0.6197708484362799, 2.1670747178126035), (0, 0))
            ThreePointArc((0, 0), (1.0227169863260859, 0.03740532831092148), (2.0454339726521837, 5e-17))
        make_face()
    extrude(amount=3)
    with BuildSketch(Plane(origin=(138.68558579261725, 29.049620107018022, 3), x_dir=(1, 0, 0), z_dir=(0, 0, -1))) as fillet_1_piece_18:
        with BuildLine():
            CenterArc((2.239017157823781, 3), FILLET_1_R, 200.4886819411101, 69.51131805888991)
            ThreePointArc((-0.5712068922540539, 1.9499329600620143), (-0.2501815737843174, 0.9853428458000373), (0, 0))
            Line((0, 0), (2.239017157823781, 0))
        make_face()
    extrude(amount=3)
    with BuildSketch(Plane(origin=(176.7130134299426, 29.049620107018022, 3), x_dir=(-0.08949841173945887, -0.9959869649227917, 0), z_dir=(0, 0, -1))) as fillet_1_piece_19:
        with BuildLine():
            CenterArc((3.2815211967518683, 2.998403344451645), FILLET_1_R, 174.86524824854192, 97.00415022459947)
            Line((0.29356030198349303, 3.266898579670022), (0, 0))
            ThreePointArc((0, 0), (1.6896926532610193, -0.02756738048459419), (3.37938530652206, -2e-17))
        make_face()
    extrude(amount=3)
    with BuildSketch(Plane(origin=(173.95081110549165, 15.066052095485404, 3), x_dir=(-0.994341129185962, -0.1062342638191007, 0), z_dir=(0, 0, -1))) as fillet_1_piece_20:
        with BuildLine():
            CenterArc((1.944914405279492, 2.9999999999999996), FILLET_1_R, 202.9640654934915, 67.03593450650857)
            ThreePointArc((-0.8173347828283964, 1.8295387991063596), (-0.41751534735678364, 0.9108166317013427), (0, 0))
            Line((0, 0), (1.944914405279496, -1e-17))
        make_face()
    extrude(amount=3)
    with BuildSketch(Plane(origin=(66.50791358615419, 10, 3), x_dir=(-1, 0, 0), z_dir=(0, 0, -1))) as fillet_1_piece_21:
        with BuildLine():
            CenterArc((FILLET_1_R * 0.265800810182, FILLET_1_R), FILLET_1_R, 240.229818231195, 29.770181768805003)
            Line((-FILLET_1_R * 0.230721475591, FILLET_1_R * 0.131976025832), (0, 0))
            Line((0, 0), (FILLET_1_R * 0.265800810182, 0))
        make_face()
    extrude(amount=3)
    with BuildSketch(Plane(origin=(26.507913586154185, 10.000000000000002, 3), x_dir=(-0.7071067811865482, 0.7071067811865468, 0), z_dir=(0, 0, -1))) as fillet_1_piece_22:
        with BuildLine():
            CenterArc((FILLET_1_R * 0.414213562373, FILLET_1_R), FILLET_1_R, 225.00000000000006, 45.000000000000114)
            Line((-FILLET_1_R * 0.292893218813, FILLET_1_R * 0.292893218813), (0, 0))
            Line((0, 0), (FILLET_1_R * 0.414213562373, 1e-17))
        make_face()
    extrude(amount=3)
    # the kernel refuses this fillet: 3 mm, written as the material it takes off along each edge
    with BuildSketch(Plane(origin=(185.64181138843185, 55.40022887772366, -5.916554139644239), x_dir=(0.3429596926027861, -0.9393501206950486, 0), z_dir=(0, 0, 1))) as fillet_1_2_piece_1:
        with BuildLine():
            CenterArc((2.312007309953282, -2.999502837675169), FILLET_1_R, 88.95688520370253, 76.28063656309585)
            Line((-0.5889640915743037, -2.2350651832395365), (0, 0))
            ThreePointArc((0, 0), (1.183310827928844, 0.010771850371206), (2.366621655857689, 6e-17))
        make_face()
    extrude(amount=14.833108279288478, mode=Mode.SUBTRACT)
    with BuildSketch(Plane(origin=(174.6526232336509, 54.381794914030856, 3.6717035747929345), x_dir=(-0.9634885943550205, -0.26774937637235796, 0), z_dir=(0, 0, -1))) as fillet_1_2_piece_2:
        with BuildLine():
            CenterArc((FILLET_1_R * 0.0895604766391, -FILLET_1_R), FILLET_1_R, 90.00000000000188, 10.235566175230105)
            Line((-FILLET_1_R * 0.0881351658569, -FILLET_1_R * 0.0159145064386), (0, 0))
            Line((0, 0), (FILLET_1_R * 0.0895604766391, -1e-17))
        make_face()
    extrude(amount=4.34340714958587, mode=Mode.SUBTRACT)
    with BuildSketch(Plane(origin=(186.64735263363326, 11.394080625595256, -5.014960799028406), x_dir=(-0.9943411291859617, -0.10623426381910225, 0), z_dir=(0, 0, 1))) as fillet_1_2_piece_3:
        with BuildLine():
            CenterArc((1.9591455422097777, -2.9999999999999996), FILLET_1_R, 89.99999999999983, 67.1875610802881)
            ThreePointArc((-0.806191458360402, -1.8368528582859858), (-0.41018210878156197, -0.9153162297170893), (0, 0))
            Line((0, 0), (1.9591455422097865, 2e-17))
        make_face()
    extrude(amount=13.029921598056813, mode=Mode.SUBTRACT)

    # Эскиз12 → Вырез-Вытянуть4 (cut)
    with BuildSketch(Plane.XY):
        with Locations((124.99999999999999, 31.999999999999986)):
            Circle(SKETCH_12_R)
    extrude(amount=CUT_EXTRUDE_4_DEPTH, mode=Mode.SUBTRACT)


solid = part.part
